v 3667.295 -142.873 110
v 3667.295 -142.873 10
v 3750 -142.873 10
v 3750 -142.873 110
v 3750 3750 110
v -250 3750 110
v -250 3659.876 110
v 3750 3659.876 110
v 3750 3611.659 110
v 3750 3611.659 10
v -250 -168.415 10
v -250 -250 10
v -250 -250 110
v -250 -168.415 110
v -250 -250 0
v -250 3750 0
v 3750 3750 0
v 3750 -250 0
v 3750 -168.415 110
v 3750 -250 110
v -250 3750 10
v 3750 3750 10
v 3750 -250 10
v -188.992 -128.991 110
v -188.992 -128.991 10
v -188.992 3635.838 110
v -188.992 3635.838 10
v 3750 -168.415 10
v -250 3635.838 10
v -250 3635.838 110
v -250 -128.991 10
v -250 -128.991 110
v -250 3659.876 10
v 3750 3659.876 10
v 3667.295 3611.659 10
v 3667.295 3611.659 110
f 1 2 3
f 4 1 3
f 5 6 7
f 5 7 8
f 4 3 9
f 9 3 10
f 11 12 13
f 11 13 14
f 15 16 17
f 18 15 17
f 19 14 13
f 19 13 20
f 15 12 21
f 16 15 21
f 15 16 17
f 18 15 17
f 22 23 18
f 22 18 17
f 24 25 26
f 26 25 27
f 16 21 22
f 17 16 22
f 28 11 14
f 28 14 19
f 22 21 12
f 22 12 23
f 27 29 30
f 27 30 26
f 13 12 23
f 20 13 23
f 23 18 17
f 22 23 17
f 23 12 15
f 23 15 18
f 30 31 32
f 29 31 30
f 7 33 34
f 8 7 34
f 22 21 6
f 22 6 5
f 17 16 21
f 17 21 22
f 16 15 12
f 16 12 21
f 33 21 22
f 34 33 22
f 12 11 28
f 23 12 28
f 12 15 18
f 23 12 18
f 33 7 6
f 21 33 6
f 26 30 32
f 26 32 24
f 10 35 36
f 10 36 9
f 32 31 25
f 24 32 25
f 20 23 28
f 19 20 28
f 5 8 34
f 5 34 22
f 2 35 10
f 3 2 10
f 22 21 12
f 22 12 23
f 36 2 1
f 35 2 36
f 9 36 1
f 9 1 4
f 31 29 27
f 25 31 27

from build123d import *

# Parameters (mm, degrees)
SKETCH1_W           = 4000
SKETCH1_H           = 4000
BOSS_EXTRUDE1_DEPTH = 10
SKETCH2_W           = 4000
SKETCH2_H           = 4000
BOSS_EXTRUDE2_DEPTH = 10
SKETCH3_W           = 4000
SKETCH3_H           = 90.124072545
BOSS_EXTRUDE3_DEPTH = 100
SKETCH4_W           = 4000
SKETCH4_H           = 81.585108981
BOSS_EXTRUDE4_DEPTH = 100
SKETCH5_W           = 82.704697277
SKETCH5_H           = 3754.532371486
BOSS_EXTRUDE5_DEPTH = 100
SKETCH6_W           = 61.008409113
SKETCH6_H           = 3764.829598476
BOSS_EXTRUDE6_DEPTH = 100


with BuildPart() as part:
    # Sketch1 → Boss-Extrude1 (new body)
    with BuildSketch(Plane.XY):
        with Locations((1750, 1750)):
            Rectangle(SKETCH1_W, SKETCH1_H)
    extrude(amount=BOSS_EXTRUDE1_DEPTH)


with BuildPart() as body_2:
    # Sketch2 → Boss-Extrude2 (new body)
    with BuildSketch(Plane.XY.offset(10)):
        with Locations((1750, 1750)):
            Rectangle(SKETCH2_W, SKETCH2_H)
    extrude(amount=-BOSS_EXTRUDE2_DEPTH)


with BuildPart() as body_3:
    # Sketch3 → Boss-Extrude3 (new body)
    with BuildSketch(Plane.XY.offset(10)):
        with Locations((1750, 3704.937963728)):
            Rectangle(SKETCH3_W, SKETCH3_H)
    extrude(amount=BOSS_EXTRUDE3_DEPTH)


with BuildPart() as body_4:
    # Sketch4 → Boss-Extrude4 (new body)
    with BuildSketch(Plane.XY.offset(10)):
        with Locations((1750, -209.20744551)):
            Rectangle(SKETCH4_W, SKETCH4_H)
    extrude(amount=BOSS_EXTRUDE4_DEPTH)


with BuildPart() as body_5:
    # Sketch5 → Boss-Extrude5 (new body)
    with BuildSketch(Plane.XY.offset(10)):
        with Locations((3708.647651362, 1734.392725891)):
            Rectangle(SKETCH5_W, SKETCH5_H)
    extrude(amount=BOSS_EXTRUDE5_DEPTH)


with BuildPart() as body_6:
    # Sketch6 → Boss-Extrude6 (new body)
    with BuildSketch(Plane.XY.offset(10)):
        with Locations((-219.495795444, 1753.423394069)):
            Rectangle(SKETCH6_W, SKETCH6_H)
    extrude(amount=BOSS_EXTRUDE6_DEPTH)


solid = Compound([part.part, body_2.part, body_3.part, body_4.part, body_5.part, body_6.part])
